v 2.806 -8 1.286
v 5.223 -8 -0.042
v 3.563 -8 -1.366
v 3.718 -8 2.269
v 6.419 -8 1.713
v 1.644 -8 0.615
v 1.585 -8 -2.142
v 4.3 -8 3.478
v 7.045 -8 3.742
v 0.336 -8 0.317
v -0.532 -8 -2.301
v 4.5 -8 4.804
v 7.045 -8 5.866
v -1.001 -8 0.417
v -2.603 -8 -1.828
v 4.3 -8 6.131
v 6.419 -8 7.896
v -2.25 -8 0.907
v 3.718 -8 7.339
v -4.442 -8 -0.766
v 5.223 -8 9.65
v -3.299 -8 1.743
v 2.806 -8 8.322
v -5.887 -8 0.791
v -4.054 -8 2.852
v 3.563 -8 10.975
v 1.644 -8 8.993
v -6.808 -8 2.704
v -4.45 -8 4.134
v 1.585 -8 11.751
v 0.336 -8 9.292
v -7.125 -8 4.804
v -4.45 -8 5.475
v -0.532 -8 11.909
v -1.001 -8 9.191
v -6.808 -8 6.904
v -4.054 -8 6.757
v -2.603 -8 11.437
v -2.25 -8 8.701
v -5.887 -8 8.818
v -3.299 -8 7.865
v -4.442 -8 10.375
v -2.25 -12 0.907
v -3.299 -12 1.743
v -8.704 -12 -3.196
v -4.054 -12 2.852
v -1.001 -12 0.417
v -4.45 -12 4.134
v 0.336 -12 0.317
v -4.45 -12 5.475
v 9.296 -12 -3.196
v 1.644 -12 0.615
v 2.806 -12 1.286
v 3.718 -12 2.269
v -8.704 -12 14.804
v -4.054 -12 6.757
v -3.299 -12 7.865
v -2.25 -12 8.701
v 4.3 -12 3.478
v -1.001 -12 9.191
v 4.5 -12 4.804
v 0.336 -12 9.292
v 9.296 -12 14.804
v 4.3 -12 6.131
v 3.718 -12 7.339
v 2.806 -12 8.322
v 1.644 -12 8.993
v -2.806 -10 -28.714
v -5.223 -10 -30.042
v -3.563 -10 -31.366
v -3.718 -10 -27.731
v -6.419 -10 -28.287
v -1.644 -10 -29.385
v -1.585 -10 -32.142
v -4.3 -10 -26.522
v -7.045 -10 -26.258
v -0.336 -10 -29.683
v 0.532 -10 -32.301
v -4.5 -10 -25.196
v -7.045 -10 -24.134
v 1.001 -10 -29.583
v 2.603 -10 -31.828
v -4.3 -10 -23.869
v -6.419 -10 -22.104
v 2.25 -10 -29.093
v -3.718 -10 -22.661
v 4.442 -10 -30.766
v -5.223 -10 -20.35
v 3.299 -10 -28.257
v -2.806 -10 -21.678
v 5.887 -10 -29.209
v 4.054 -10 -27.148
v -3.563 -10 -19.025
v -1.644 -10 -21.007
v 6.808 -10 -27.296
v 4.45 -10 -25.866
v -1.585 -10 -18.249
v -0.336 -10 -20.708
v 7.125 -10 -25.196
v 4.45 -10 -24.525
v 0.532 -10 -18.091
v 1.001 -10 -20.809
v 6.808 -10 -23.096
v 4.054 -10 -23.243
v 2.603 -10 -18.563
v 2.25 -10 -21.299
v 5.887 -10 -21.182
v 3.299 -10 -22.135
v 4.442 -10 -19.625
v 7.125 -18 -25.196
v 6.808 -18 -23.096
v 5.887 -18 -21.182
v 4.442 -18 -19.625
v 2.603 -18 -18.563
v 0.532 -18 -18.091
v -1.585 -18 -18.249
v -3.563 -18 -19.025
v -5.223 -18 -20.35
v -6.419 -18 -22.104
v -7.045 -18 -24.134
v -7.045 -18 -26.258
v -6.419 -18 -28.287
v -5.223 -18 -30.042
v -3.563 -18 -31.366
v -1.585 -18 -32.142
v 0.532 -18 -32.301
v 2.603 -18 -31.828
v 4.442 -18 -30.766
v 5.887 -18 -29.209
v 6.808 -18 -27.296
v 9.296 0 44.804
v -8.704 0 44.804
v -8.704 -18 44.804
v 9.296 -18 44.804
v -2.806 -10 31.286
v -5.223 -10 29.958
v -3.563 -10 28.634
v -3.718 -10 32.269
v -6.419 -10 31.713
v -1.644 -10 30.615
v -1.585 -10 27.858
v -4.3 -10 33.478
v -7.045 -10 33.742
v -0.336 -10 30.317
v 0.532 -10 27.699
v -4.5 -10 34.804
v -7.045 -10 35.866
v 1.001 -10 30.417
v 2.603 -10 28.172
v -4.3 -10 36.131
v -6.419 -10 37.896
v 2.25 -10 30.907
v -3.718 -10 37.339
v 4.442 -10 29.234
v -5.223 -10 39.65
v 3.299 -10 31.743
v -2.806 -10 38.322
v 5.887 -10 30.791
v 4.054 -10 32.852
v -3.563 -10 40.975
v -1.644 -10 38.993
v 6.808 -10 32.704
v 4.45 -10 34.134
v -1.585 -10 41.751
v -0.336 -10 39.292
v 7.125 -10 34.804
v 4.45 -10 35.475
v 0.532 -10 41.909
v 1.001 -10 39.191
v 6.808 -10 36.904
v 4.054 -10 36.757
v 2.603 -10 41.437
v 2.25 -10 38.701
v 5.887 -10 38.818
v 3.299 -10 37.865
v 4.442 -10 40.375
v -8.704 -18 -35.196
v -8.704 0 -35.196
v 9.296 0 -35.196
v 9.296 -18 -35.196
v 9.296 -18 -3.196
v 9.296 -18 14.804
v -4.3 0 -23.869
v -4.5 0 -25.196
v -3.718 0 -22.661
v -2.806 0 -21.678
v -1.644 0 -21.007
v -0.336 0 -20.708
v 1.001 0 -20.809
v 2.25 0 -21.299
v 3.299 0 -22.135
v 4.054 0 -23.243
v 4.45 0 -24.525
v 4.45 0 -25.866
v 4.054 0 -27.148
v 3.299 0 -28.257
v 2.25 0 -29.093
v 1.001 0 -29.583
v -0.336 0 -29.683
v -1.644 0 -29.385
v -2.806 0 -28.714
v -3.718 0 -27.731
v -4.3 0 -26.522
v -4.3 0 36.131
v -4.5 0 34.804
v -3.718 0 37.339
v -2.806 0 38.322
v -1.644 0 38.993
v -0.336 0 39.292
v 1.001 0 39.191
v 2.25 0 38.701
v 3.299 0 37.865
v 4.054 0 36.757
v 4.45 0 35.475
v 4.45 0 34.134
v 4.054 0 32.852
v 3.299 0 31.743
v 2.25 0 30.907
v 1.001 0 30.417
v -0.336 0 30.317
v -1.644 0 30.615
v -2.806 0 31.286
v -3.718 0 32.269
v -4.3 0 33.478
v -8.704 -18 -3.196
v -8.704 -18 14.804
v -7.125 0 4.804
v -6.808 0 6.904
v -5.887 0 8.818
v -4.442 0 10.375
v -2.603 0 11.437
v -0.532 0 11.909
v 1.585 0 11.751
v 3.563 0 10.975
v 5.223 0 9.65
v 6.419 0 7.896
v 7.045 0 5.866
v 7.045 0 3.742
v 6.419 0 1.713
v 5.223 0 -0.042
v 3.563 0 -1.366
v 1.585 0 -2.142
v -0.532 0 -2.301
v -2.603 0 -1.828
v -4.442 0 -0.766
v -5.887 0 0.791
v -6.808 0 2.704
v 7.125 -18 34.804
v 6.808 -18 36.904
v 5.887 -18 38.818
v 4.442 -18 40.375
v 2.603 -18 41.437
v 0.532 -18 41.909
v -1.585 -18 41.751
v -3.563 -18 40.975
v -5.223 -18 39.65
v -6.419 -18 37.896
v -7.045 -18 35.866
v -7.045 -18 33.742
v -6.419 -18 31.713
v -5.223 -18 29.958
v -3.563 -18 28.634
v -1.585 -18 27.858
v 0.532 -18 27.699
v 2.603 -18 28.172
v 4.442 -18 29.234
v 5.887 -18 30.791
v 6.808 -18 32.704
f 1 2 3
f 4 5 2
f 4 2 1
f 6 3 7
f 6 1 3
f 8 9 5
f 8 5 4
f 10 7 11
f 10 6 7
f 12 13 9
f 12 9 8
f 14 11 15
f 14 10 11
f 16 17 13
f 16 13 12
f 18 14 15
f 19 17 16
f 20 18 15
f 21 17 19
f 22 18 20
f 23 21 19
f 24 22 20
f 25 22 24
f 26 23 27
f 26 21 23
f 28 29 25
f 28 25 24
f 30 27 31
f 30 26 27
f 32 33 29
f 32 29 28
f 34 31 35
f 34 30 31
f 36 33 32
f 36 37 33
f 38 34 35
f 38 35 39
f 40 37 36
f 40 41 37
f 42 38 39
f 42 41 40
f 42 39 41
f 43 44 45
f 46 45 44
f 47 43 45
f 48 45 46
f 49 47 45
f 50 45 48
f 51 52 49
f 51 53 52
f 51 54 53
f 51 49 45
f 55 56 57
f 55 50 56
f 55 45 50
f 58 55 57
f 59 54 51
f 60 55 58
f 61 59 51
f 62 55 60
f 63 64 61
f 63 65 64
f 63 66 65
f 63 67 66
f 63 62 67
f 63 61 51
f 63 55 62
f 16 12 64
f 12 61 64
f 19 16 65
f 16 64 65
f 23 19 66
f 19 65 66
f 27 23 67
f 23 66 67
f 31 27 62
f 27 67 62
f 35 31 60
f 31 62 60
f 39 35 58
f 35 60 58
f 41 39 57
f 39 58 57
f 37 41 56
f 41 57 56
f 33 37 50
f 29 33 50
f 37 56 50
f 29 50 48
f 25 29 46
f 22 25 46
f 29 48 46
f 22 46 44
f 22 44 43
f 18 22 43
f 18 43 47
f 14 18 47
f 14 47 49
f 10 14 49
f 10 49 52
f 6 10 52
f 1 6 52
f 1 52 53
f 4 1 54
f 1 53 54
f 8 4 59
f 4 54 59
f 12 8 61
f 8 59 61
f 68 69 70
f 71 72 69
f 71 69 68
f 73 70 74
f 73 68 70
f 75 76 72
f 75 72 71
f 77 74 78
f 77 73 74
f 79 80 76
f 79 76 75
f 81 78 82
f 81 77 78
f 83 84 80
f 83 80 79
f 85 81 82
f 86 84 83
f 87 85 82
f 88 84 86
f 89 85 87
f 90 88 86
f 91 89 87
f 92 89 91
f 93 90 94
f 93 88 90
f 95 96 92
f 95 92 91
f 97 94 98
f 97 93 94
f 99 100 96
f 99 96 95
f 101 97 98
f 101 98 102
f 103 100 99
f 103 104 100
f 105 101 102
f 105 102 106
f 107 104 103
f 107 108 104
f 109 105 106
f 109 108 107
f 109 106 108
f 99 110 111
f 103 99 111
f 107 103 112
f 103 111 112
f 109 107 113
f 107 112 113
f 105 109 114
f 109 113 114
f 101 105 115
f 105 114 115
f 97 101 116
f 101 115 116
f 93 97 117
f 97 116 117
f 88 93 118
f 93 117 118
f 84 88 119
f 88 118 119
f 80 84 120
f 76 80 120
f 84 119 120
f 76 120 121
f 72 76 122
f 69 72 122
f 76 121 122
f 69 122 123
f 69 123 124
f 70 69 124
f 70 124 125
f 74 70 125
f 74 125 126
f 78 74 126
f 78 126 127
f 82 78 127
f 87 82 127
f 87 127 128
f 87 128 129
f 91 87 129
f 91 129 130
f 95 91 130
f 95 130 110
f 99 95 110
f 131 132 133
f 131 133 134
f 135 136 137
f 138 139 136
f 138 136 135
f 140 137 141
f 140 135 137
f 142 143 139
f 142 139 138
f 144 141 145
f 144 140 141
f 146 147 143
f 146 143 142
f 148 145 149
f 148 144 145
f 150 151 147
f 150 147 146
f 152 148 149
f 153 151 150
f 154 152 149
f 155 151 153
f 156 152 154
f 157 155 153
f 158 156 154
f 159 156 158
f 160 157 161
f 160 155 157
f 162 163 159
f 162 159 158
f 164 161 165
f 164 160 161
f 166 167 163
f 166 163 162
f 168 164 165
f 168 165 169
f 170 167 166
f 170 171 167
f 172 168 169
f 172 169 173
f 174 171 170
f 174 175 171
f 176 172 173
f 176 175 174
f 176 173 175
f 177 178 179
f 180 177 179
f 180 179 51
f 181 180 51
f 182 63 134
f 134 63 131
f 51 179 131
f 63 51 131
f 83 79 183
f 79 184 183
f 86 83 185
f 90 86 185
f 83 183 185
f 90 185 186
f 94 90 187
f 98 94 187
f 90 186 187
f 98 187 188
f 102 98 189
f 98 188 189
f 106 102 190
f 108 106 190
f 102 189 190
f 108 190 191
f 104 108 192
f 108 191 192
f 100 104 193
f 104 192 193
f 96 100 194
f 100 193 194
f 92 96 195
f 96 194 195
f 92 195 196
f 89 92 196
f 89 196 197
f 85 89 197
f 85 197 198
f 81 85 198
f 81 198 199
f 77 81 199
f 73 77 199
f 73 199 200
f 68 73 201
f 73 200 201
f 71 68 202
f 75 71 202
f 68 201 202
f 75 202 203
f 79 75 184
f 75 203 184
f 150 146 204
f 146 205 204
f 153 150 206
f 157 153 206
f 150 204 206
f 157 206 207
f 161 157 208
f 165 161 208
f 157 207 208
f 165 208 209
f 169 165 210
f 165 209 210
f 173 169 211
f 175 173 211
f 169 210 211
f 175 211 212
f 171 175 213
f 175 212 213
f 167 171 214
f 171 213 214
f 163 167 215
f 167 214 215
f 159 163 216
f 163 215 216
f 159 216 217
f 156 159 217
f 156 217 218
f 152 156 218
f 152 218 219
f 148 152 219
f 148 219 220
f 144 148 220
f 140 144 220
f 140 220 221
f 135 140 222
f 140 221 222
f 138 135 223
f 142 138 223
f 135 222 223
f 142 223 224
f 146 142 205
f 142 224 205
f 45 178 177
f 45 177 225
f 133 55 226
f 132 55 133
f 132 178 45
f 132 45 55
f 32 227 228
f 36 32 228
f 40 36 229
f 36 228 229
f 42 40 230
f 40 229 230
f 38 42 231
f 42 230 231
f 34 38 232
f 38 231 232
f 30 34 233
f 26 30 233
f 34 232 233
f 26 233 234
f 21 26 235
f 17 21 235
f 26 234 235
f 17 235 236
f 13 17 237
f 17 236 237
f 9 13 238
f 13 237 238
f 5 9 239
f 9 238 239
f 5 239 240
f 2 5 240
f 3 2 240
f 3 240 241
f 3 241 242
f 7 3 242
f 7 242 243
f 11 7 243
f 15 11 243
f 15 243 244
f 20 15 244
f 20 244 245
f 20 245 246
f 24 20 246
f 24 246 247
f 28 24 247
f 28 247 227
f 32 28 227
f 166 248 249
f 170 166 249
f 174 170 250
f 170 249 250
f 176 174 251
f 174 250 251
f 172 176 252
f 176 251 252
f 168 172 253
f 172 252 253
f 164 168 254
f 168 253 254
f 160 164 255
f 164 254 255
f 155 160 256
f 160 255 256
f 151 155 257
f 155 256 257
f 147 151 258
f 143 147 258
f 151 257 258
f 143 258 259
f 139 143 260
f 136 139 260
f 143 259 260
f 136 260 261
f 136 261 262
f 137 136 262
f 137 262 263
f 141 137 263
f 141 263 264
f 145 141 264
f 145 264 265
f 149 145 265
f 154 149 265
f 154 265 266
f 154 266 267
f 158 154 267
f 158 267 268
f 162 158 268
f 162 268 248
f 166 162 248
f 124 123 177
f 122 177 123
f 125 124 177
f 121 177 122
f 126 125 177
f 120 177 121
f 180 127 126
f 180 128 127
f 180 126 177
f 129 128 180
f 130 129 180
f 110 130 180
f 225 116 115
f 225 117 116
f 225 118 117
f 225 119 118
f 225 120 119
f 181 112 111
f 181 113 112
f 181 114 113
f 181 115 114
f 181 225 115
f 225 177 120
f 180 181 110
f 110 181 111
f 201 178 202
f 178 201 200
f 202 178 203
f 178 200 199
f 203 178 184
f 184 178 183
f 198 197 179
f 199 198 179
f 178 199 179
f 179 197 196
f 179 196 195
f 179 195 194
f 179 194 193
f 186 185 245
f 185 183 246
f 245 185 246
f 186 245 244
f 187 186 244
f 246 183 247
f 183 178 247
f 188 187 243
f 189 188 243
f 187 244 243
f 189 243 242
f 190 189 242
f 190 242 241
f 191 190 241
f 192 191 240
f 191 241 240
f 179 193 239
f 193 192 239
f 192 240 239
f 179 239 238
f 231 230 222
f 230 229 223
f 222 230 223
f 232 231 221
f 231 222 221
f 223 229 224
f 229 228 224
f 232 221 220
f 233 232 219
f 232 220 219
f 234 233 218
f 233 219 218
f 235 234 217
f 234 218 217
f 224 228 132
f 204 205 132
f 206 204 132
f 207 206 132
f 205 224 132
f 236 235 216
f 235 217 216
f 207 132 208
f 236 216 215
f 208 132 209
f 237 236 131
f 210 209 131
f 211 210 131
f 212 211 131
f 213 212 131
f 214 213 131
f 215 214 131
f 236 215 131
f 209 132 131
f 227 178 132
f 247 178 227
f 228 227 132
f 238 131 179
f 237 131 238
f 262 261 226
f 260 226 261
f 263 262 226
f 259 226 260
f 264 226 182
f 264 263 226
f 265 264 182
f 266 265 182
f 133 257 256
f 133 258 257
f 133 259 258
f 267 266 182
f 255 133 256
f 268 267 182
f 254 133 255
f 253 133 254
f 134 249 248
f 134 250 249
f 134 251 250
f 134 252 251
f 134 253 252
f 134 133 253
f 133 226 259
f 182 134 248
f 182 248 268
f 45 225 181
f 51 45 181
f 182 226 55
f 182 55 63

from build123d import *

# Parameters (mm, degrees)
F0_W           = 18
F0_H           = 80
F1_DEPTH       = 18
F3_D           = 9
F3_DEPTH       = 18.75
F3_CBORE_D     = 14.25
F3_CBORE_DEPTH = 8
F3_TIP         = 2.7038727856
F4_W           = 18
F4_H           = 18
F5_DEPTH       = 6
F7_D           = 9
F7_DEPTH       = 18.75
F7_CBORE_D     = 14.25
F7_CBORE_DEPTH = 8
F7_TIP         = 2.7038727856


with BuildPart() as f1:
    # F0 (on Front) → F1 (new body)
    with BuildSketch(Plane.XZ):
        with Locations((0.2960520796, 4.8042173386)):
            Rectangle(F0_W, F0_H)
    extrude(amount=F1_DEPTH)

    # F3
    with Locations(Plane.XZ.offset(18)):
        with Locations((0, 34.8042173386), (0, -25.1957826614)):
            CounterBoreHole(F3_D / 2, F3_CBORE_D / 2, F3_CBORE_DEPTH, depth=F3_DEPTH)
            with Locations((0, 0, -(F3_DEPTH + F3_TIP / 2))):  # 118° drill point
                Cone(0, F3_D / 2, F3_TIP, mode=Mode.SUBTRACT)

    # F4 (on face) → F5 (cut)
    with BuildSketch(Plane.XZ.offset(18)):
        with Locations((0.2960520796, 5.8042173386)):
            Rectangle(F4_W, F4_H)
    extrude(amount=-F5_DEPTH, mode=Mode.SUBTRACT)

    # F7
    with Locations(Plane(origin=(0, 0, 0), x_dir=(-1, 0, 0), z_dir=(0, 1, 0))):
        with Locations((0, 4.8042173386)):
            CounterBoreHole(F7_D / 2, F7_CBORE_D / 2, F7_CBORE_DEPTH, depth=F7_DEPTH)
            with Locations((0, 0, -(F7_DEPTH + F7_TIP / 2))):  # 118° drill point
                Cone(0, F7_D / 2, F7_TIP, mode=Mode.SUBTRACT)


solid = f1.part
